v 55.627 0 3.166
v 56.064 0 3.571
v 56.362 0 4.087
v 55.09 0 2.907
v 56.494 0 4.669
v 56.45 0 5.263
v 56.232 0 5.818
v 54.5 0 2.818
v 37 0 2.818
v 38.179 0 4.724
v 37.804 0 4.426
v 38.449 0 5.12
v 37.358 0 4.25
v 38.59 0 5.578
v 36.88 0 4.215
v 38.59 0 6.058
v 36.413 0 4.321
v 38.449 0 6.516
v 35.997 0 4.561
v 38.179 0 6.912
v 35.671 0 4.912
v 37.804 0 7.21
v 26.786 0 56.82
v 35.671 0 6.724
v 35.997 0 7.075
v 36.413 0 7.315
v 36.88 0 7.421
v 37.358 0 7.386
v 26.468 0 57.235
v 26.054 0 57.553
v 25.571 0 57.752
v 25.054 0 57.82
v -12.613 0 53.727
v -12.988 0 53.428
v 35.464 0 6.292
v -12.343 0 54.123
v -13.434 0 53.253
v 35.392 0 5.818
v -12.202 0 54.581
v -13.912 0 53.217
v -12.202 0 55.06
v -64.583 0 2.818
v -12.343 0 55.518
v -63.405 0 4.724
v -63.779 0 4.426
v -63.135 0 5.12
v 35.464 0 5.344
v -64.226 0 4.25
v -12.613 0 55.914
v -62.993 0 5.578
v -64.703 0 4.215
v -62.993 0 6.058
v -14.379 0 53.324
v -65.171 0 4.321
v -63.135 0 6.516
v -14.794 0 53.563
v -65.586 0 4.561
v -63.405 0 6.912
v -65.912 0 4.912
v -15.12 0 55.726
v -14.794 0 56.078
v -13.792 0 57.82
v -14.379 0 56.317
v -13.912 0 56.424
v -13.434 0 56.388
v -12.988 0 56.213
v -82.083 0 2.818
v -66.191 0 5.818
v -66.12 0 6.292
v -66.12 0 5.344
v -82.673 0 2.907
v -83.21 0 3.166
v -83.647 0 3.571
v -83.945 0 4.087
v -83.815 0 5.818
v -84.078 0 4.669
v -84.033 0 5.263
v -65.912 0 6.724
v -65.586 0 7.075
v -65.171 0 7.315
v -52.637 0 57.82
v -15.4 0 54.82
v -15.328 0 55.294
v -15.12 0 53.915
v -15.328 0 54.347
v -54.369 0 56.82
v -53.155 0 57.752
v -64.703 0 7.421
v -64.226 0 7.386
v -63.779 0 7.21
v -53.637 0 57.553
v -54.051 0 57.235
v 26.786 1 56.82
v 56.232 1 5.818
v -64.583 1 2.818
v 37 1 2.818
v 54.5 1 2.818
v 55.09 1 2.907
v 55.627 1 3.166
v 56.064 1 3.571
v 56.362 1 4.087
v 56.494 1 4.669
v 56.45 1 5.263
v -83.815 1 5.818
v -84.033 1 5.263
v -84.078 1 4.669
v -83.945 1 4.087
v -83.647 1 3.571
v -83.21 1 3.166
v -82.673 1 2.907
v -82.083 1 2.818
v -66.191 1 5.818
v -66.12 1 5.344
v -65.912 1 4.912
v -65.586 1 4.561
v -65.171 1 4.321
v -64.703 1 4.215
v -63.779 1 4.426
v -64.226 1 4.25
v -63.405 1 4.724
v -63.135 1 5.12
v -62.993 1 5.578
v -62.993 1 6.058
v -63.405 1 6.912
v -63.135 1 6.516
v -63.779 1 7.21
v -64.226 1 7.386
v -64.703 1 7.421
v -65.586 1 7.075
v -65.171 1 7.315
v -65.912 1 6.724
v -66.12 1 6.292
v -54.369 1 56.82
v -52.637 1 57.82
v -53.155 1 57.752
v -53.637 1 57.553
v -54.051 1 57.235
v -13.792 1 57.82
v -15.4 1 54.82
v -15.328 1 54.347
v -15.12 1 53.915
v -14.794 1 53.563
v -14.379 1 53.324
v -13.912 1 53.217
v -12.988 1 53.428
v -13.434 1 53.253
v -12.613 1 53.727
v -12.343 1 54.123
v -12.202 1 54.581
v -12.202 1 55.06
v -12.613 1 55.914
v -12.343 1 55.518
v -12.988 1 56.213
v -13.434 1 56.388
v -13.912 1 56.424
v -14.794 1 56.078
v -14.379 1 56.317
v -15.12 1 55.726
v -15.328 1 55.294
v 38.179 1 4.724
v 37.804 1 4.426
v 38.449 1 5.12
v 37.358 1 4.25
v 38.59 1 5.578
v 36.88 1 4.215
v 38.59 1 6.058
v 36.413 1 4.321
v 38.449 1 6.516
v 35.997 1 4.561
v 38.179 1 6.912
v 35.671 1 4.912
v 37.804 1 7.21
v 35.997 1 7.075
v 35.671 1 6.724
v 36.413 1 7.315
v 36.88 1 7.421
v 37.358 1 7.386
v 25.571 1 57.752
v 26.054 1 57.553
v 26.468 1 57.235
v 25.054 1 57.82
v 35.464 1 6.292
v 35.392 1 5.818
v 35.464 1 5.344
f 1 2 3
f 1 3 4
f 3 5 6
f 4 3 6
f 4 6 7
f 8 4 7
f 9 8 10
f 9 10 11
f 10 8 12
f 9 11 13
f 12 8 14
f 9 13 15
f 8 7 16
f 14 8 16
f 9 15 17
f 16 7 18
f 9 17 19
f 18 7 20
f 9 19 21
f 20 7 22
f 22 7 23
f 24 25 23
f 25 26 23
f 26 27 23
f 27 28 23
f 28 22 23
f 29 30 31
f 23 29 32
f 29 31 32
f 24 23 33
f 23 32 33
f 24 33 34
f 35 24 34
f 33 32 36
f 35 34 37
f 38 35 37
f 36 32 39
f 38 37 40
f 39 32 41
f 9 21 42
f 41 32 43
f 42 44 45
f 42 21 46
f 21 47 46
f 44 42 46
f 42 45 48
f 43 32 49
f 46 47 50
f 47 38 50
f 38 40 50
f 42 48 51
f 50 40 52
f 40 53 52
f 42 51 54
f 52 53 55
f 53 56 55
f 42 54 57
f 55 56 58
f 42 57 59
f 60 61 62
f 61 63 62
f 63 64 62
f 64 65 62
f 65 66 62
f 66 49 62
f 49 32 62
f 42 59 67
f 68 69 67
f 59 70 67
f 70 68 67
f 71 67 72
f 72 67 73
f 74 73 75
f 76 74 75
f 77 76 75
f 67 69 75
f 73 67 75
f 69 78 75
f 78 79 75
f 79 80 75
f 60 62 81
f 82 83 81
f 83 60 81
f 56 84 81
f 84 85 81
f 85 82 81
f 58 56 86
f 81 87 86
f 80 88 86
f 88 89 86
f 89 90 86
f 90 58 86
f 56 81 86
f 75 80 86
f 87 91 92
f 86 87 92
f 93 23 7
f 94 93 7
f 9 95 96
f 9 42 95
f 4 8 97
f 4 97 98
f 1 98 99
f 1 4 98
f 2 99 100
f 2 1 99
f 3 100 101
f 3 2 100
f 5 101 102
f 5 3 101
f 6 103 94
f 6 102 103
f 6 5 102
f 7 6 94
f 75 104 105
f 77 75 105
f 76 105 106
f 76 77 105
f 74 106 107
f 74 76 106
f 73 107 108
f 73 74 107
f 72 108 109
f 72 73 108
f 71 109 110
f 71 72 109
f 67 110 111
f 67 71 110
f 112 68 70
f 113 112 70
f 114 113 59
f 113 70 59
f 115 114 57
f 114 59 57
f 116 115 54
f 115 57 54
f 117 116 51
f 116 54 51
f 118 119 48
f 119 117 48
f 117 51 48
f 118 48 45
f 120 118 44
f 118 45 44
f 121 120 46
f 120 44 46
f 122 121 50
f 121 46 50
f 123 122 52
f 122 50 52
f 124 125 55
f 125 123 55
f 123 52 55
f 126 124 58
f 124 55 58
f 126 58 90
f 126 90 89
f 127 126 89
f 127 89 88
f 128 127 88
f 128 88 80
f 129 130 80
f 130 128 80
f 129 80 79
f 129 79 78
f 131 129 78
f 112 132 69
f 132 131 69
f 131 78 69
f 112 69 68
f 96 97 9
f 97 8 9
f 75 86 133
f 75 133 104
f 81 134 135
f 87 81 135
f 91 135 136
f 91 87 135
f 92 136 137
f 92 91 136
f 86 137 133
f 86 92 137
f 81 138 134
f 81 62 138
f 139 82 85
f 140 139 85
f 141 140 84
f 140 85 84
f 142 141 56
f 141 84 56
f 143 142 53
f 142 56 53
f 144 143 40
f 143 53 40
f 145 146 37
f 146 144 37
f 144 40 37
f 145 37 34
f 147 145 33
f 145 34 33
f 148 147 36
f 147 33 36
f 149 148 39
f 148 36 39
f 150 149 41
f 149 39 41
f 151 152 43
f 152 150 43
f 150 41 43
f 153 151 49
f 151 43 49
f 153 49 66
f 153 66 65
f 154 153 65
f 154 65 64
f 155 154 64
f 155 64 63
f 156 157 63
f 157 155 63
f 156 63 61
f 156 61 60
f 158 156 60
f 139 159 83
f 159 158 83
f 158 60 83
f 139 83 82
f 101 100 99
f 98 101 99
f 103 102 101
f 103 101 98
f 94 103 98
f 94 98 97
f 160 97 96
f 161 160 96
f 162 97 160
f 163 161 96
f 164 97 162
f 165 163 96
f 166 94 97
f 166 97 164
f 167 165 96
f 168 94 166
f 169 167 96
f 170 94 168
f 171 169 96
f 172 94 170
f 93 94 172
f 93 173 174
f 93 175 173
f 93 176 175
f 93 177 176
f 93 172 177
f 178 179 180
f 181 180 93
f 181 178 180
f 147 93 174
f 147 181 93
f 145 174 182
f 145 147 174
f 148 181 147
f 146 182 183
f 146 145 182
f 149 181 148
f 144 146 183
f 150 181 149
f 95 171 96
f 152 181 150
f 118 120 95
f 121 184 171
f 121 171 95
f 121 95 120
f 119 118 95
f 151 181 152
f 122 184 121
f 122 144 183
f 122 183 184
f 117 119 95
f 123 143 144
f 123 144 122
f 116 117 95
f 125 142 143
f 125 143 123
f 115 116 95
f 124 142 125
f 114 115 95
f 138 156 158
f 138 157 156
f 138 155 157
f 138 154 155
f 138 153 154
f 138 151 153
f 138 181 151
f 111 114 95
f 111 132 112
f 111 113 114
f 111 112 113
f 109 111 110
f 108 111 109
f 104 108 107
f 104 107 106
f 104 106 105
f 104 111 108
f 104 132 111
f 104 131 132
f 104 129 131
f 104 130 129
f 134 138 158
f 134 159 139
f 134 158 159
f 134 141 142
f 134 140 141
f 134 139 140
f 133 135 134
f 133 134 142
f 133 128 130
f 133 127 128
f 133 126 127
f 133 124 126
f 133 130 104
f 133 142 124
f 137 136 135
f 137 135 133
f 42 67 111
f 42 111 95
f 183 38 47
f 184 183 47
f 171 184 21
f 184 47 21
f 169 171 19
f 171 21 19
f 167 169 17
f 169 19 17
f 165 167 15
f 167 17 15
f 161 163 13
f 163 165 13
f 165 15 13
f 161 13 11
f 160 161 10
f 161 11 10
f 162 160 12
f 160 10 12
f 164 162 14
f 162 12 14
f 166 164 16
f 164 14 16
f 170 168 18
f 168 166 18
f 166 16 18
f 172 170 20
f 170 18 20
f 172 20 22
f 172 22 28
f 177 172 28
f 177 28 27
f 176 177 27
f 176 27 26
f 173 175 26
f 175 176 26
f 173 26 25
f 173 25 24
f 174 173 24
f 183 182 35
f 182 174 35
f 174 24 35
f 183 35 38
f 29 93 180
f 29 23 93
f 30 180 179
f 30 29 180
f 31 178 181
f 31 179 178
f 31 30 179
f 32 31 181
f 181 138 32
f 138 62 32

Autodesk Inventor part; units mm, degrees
ref_plane "YZ Plane" through (0, 0, 0) normal (1, 0, 0) x (0, 1, 0)
ref_plane "XZ Plane" through (0, 0, 0) normal (0, 1, 0) x (-1, 0, 0)
ref_plane "XY Plane" through (0, 0, 0) normal (0, 0, 1) x (1, 0, 0)
sketch "Sketch1" plane through (0, 0, 0) normal (0, 1, 0) x (-1, 0, 0)
  circle A0 centre (-37, 5.818) radius 1.6079
  circle A1 centre (13.7917, 54.8205) radius 1.6079
  line L0 (13.7917, 57.8205) -> (-25.0536, 57.8205)
  line L1 (-26.7857, 56.8205) -> (-56.232, 5.818)
  line L2 (64.5833, 2.818) -> (-37, 2.818)
  line L3 (-54.5, 2.818) -> (-37, 2.818)
  line L4 (13.7917, 57.8205) -> (52.637, 57.8205)
  line L5 (54.369, 56.8205) -> (83.8153, 5.818)
  line L6 (82.0833, 2.818) -> (64.5833, 2.818)
  circle A2 centre (64.5833, 5.818) radius 1.6079
  arc A3 (82.0833, 2.818) -> (83.8153, 5.818) centre (82.0833, 4.818) ccw
  arc A4 (-56.232, 5.818) -> (-54.5, 2.818) centre (-54.5, 4.818) ccw
  arc A5 (-25.0536, 57.8205) -> (-26.7857, 56.8205) centre (-25.0536, 55.8205) ccw
  arc A6 (54.369, 56.8205) -> (52.637, 57.8205) centre (52.637, 55.8205) ccw
  dimension "d13" = 2
  dimension "d14" = 2
extrude "Extrusion1" add sketch "Sketch1" along normal blind 1
properties part number "Veroboard"
